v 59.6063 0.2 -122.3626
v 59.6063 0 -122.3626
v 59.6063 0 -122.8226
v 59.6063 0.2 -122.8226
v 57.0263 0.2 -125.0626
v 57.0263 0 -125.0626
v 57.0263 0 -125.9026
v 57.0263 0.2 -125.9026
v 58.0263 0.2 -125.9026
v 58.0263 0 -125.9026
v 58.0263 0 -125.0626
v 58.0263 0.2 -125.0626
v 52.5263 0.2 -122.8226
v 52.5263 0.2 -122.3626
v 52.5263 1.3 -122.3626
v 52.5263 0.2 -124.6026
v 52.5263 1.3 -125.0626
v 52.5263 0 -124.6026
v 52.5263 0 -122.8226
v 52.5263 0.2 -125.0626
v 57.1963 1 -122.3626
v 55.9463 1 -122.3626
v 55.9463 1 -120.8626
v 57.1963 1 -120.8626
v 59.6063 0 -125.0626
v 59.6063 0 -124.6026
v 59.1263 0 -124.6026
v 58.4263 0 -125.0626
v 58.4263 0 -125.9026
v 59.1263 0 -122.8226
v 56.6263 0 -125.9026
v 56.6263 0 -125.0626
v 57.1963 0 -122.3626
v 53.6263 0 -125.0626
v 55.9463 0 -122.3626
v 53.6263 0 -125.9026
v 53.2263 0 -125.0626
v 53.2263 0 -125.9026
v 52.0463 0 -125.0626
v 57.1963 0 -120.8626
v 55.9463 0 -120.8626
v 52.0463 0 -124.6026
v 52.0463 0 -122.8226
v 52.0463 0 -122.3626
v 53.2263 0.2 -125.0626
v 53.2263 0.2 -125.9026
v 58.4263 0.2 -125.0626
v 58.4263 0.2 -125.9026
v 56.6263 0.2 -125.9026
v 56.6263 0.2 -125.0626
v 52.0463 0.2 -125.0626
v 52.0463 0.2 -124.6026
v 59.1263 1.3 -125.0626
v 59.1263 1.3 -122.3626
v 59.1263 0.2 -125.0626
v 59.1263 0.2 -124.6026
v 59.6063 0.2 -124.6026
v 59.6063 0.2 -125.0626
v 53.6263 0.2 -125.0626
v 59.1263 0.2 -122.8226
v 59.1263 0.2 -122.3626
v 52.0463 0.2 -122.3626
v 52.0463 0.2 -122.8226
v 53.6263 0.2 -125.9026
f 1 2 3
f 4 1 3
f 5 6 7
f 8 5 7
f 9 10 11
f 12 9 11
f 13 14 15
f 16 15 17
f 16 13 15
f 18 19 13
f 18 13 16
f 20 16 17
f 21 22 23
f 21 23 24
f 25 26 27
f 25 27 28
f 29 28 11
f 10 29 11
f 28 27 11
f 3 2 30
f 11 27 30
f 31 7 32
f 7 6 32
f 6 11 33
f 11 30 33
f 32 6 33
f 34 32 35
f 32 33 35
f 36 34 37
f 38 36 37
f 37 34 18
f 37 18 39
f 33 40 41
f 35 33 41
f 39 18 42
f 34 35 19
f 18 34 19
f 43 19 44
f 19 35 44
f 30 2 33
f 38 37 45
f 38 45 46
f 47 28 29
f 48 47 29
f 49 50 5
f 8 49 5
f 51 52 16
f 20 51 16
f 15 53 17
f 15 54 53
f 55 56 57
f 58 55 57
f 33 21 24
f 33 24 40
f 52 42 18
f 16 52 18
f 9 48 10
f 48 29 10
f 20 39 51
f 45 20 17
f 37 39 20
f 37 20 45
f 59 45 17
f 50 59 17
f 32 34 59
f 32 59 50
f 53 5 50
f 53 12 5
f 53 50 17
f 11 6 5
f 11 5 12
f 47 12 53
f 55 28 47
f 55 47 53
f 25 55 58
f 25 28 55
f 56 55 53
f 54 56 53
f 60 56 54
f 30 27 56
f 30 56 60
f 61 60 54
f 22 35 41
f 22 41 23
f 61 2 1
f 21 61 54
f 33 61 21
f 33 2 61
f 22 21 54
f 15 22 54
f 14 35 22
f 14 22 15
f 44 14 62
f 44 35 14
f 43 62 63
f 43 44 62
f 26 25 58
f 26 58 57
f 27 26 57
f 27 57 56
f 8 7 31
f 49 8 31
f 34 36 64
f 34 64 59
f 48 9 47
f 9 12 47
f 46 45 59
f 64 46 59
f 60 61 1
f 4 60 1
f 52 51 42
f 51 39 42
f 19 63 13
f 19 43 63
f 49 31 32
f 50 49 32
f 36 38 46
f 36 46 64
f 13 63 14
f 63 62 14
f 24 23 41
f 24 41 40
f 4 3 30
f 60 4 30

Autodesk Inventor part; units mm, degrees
sketch "Sketch1" plane through (0, 0, 0) normal (0, 1, 0) x (-1, 0, 0)
  line L0 (-52.5263, -125.0626) -> (-59.1263, -125.0626)
  line L1 (-59.1263, -125.0626) -> (-59.1263, -122.3626)
  line L2 (-59.1263, -122.3626) -> (-52.5263, -122.3626)
  line L3 (-52.5263, -122.3626) -> (-52.5263, -125.0626)
  dimension "d0" = 6.6
  dimension "d1" = 2.7
extrude "Extrusion1" add sketch "Sketch1" along normal blind 1.3
sketch "Sketch2" plane through (52.5263, 0, -122.3626) normal (0, 0, 1) x (1, 0, 0)
  line L0 (6.6, 0) -> (6.6, 1.3) projected
  line L1 (6.6, 1.3) -> (4.67, 1.3)
  line L2 (0, 1.3) -> (6.6, 1.3) projected
  line L3 (0, 0) -> (6.6, 0) projected
  line L4 (4.67, 0) -> (3.42, 0)
  line L5 (3.42, 0) -> (3.42, 1)
  line L6 (3.42, 1) -> (4.67, 1)
  line L7 (4.67, 1) -> (4.67, 0)
  point P0 (3.42, 0)
  dimension "d4" = 1.93
  dimension "d5" = 1.25
  dimension "d6" = 1
extrude "Extrusion2" add sketch "Sketch2" along normal blind 1.5
sketch "Sketch3" plane through (0, 0, 0) normal (0, -1, 0) x (1, 0, 0)
  line L0 (55.8263, -125.0626) -> (55.8263, -126.2505)
  line L1 (52.5263, -125.0626) -> (52.0463, -125.0626)
  line L2 (52.0463, -125.0626) -> (52.0463, -124.6026)
  line L3 (52.0463, -124.6026) -> (52.5263, -124.6026)
  line L4 (52.5263, -122.3626) -> (52.0463, -122.3626)
  line L5 (52.0463, -122.3626) -> (52.0463, -122.8226)
  line L6 (52.0463, -122.8226) -> (52.5263, -122.8226)
  line L7 (59.1263, -125.0626) -> (59.6063, -125.0626)
  line L8 (59.6063, -125.0626) -> (59.6063, -124.6026)
  line L9 (59.6063, -124.6026) -> (59.1263, -124.6026)
  line L10 (59.1263, -122.3626) -> (59.6063, -122.3626)
  line L11 (59.6063, -122.3626) -> (59.6063, -122.8226)
  line L12 (59.6063, -122.8226) -> (59.1263, -122.8226)
  line L13 (52.5263, -126.3425) -> (53.2263, -126.3425)
  line L14 (59.1263, -125.0626) -> (59.1263, -125.9026)
  line L15 (59.1263, -122.3626) -> (59.1263, -122.8226)
  line L16 (59.1263, -124.6026) -> (59.1263, -125.0626)
  line L17 (52.5263, -125.0626) -> (52.5263, -124.6026)
  line L18 (52.5263, -122.8226) -> (52.5263, -122.3626)
  line L19 (59.1263, -125.0626) -> (52.5263, -125.0626) projected
  line L20 (53.2263, -125.9026) -> (53.6263, -125.9026)
  line L21 (53.6263, -125.9026) -> (53.6263, -125.0626)
  line L22 (53.6263, -125.0626) -> (53.2263, -125.0626)
  line L23 (53.2263, -125.0626) -> (53.2263, -125.9026)
  line L24 (58.4263, -125.9026) -> (58.0263, -125.9026)
  line L25 (58.0263, -125.9026) -> (58.0263, -125.0626)
  line L26 (58.0263, -125.0626) -> (58.4263, -125.0626)
  line L27 (58.4263, -125.0626) -> (58.4263, -125.9026)
  line L28 (58.0263, -125.9026) -> (57.0263, -125.9026)
  line L29 (56.6263, -125.0626) -> (57.0263, -125.0626)
  line L30 (57.0263, -125.0626) -> (57.0263, -125.9026)
  line L31 (56.6263, -125.9026) -> (56.6263, -125.0626)
  line L32 (57.0263, -125.9026) -> (56.6263, -125.9026)
  dimension "d15" = 0.4
  dimension "d16" = 1
extrude "Extrusion3" add sketch "Sketch3" against normal blind 0.2 contours L1 L2 L3 L17 | L16 L9 L8 L7 | L19 L30 L32 L31 | L19 L21 L20 L23 | L19 L27 L24 L25 | L18 L6 L5 L4 | L10 L11 L12 L15
ref_plane "Work Plane1" through (55.8263, 1.3, -122.3626) normal (1, 0, 0) x (0, 0, -1)
ref_plane "Work Plane2" through (56.5713, 0, -122.3626) normal (-1, 0, 0) x (0, 0, 1)
ref_plane "Work Plane3" through (0, 0.5, 0) normal (0, -1, 0) x (1, 0, 0)
properties part number "Power Swicth"
